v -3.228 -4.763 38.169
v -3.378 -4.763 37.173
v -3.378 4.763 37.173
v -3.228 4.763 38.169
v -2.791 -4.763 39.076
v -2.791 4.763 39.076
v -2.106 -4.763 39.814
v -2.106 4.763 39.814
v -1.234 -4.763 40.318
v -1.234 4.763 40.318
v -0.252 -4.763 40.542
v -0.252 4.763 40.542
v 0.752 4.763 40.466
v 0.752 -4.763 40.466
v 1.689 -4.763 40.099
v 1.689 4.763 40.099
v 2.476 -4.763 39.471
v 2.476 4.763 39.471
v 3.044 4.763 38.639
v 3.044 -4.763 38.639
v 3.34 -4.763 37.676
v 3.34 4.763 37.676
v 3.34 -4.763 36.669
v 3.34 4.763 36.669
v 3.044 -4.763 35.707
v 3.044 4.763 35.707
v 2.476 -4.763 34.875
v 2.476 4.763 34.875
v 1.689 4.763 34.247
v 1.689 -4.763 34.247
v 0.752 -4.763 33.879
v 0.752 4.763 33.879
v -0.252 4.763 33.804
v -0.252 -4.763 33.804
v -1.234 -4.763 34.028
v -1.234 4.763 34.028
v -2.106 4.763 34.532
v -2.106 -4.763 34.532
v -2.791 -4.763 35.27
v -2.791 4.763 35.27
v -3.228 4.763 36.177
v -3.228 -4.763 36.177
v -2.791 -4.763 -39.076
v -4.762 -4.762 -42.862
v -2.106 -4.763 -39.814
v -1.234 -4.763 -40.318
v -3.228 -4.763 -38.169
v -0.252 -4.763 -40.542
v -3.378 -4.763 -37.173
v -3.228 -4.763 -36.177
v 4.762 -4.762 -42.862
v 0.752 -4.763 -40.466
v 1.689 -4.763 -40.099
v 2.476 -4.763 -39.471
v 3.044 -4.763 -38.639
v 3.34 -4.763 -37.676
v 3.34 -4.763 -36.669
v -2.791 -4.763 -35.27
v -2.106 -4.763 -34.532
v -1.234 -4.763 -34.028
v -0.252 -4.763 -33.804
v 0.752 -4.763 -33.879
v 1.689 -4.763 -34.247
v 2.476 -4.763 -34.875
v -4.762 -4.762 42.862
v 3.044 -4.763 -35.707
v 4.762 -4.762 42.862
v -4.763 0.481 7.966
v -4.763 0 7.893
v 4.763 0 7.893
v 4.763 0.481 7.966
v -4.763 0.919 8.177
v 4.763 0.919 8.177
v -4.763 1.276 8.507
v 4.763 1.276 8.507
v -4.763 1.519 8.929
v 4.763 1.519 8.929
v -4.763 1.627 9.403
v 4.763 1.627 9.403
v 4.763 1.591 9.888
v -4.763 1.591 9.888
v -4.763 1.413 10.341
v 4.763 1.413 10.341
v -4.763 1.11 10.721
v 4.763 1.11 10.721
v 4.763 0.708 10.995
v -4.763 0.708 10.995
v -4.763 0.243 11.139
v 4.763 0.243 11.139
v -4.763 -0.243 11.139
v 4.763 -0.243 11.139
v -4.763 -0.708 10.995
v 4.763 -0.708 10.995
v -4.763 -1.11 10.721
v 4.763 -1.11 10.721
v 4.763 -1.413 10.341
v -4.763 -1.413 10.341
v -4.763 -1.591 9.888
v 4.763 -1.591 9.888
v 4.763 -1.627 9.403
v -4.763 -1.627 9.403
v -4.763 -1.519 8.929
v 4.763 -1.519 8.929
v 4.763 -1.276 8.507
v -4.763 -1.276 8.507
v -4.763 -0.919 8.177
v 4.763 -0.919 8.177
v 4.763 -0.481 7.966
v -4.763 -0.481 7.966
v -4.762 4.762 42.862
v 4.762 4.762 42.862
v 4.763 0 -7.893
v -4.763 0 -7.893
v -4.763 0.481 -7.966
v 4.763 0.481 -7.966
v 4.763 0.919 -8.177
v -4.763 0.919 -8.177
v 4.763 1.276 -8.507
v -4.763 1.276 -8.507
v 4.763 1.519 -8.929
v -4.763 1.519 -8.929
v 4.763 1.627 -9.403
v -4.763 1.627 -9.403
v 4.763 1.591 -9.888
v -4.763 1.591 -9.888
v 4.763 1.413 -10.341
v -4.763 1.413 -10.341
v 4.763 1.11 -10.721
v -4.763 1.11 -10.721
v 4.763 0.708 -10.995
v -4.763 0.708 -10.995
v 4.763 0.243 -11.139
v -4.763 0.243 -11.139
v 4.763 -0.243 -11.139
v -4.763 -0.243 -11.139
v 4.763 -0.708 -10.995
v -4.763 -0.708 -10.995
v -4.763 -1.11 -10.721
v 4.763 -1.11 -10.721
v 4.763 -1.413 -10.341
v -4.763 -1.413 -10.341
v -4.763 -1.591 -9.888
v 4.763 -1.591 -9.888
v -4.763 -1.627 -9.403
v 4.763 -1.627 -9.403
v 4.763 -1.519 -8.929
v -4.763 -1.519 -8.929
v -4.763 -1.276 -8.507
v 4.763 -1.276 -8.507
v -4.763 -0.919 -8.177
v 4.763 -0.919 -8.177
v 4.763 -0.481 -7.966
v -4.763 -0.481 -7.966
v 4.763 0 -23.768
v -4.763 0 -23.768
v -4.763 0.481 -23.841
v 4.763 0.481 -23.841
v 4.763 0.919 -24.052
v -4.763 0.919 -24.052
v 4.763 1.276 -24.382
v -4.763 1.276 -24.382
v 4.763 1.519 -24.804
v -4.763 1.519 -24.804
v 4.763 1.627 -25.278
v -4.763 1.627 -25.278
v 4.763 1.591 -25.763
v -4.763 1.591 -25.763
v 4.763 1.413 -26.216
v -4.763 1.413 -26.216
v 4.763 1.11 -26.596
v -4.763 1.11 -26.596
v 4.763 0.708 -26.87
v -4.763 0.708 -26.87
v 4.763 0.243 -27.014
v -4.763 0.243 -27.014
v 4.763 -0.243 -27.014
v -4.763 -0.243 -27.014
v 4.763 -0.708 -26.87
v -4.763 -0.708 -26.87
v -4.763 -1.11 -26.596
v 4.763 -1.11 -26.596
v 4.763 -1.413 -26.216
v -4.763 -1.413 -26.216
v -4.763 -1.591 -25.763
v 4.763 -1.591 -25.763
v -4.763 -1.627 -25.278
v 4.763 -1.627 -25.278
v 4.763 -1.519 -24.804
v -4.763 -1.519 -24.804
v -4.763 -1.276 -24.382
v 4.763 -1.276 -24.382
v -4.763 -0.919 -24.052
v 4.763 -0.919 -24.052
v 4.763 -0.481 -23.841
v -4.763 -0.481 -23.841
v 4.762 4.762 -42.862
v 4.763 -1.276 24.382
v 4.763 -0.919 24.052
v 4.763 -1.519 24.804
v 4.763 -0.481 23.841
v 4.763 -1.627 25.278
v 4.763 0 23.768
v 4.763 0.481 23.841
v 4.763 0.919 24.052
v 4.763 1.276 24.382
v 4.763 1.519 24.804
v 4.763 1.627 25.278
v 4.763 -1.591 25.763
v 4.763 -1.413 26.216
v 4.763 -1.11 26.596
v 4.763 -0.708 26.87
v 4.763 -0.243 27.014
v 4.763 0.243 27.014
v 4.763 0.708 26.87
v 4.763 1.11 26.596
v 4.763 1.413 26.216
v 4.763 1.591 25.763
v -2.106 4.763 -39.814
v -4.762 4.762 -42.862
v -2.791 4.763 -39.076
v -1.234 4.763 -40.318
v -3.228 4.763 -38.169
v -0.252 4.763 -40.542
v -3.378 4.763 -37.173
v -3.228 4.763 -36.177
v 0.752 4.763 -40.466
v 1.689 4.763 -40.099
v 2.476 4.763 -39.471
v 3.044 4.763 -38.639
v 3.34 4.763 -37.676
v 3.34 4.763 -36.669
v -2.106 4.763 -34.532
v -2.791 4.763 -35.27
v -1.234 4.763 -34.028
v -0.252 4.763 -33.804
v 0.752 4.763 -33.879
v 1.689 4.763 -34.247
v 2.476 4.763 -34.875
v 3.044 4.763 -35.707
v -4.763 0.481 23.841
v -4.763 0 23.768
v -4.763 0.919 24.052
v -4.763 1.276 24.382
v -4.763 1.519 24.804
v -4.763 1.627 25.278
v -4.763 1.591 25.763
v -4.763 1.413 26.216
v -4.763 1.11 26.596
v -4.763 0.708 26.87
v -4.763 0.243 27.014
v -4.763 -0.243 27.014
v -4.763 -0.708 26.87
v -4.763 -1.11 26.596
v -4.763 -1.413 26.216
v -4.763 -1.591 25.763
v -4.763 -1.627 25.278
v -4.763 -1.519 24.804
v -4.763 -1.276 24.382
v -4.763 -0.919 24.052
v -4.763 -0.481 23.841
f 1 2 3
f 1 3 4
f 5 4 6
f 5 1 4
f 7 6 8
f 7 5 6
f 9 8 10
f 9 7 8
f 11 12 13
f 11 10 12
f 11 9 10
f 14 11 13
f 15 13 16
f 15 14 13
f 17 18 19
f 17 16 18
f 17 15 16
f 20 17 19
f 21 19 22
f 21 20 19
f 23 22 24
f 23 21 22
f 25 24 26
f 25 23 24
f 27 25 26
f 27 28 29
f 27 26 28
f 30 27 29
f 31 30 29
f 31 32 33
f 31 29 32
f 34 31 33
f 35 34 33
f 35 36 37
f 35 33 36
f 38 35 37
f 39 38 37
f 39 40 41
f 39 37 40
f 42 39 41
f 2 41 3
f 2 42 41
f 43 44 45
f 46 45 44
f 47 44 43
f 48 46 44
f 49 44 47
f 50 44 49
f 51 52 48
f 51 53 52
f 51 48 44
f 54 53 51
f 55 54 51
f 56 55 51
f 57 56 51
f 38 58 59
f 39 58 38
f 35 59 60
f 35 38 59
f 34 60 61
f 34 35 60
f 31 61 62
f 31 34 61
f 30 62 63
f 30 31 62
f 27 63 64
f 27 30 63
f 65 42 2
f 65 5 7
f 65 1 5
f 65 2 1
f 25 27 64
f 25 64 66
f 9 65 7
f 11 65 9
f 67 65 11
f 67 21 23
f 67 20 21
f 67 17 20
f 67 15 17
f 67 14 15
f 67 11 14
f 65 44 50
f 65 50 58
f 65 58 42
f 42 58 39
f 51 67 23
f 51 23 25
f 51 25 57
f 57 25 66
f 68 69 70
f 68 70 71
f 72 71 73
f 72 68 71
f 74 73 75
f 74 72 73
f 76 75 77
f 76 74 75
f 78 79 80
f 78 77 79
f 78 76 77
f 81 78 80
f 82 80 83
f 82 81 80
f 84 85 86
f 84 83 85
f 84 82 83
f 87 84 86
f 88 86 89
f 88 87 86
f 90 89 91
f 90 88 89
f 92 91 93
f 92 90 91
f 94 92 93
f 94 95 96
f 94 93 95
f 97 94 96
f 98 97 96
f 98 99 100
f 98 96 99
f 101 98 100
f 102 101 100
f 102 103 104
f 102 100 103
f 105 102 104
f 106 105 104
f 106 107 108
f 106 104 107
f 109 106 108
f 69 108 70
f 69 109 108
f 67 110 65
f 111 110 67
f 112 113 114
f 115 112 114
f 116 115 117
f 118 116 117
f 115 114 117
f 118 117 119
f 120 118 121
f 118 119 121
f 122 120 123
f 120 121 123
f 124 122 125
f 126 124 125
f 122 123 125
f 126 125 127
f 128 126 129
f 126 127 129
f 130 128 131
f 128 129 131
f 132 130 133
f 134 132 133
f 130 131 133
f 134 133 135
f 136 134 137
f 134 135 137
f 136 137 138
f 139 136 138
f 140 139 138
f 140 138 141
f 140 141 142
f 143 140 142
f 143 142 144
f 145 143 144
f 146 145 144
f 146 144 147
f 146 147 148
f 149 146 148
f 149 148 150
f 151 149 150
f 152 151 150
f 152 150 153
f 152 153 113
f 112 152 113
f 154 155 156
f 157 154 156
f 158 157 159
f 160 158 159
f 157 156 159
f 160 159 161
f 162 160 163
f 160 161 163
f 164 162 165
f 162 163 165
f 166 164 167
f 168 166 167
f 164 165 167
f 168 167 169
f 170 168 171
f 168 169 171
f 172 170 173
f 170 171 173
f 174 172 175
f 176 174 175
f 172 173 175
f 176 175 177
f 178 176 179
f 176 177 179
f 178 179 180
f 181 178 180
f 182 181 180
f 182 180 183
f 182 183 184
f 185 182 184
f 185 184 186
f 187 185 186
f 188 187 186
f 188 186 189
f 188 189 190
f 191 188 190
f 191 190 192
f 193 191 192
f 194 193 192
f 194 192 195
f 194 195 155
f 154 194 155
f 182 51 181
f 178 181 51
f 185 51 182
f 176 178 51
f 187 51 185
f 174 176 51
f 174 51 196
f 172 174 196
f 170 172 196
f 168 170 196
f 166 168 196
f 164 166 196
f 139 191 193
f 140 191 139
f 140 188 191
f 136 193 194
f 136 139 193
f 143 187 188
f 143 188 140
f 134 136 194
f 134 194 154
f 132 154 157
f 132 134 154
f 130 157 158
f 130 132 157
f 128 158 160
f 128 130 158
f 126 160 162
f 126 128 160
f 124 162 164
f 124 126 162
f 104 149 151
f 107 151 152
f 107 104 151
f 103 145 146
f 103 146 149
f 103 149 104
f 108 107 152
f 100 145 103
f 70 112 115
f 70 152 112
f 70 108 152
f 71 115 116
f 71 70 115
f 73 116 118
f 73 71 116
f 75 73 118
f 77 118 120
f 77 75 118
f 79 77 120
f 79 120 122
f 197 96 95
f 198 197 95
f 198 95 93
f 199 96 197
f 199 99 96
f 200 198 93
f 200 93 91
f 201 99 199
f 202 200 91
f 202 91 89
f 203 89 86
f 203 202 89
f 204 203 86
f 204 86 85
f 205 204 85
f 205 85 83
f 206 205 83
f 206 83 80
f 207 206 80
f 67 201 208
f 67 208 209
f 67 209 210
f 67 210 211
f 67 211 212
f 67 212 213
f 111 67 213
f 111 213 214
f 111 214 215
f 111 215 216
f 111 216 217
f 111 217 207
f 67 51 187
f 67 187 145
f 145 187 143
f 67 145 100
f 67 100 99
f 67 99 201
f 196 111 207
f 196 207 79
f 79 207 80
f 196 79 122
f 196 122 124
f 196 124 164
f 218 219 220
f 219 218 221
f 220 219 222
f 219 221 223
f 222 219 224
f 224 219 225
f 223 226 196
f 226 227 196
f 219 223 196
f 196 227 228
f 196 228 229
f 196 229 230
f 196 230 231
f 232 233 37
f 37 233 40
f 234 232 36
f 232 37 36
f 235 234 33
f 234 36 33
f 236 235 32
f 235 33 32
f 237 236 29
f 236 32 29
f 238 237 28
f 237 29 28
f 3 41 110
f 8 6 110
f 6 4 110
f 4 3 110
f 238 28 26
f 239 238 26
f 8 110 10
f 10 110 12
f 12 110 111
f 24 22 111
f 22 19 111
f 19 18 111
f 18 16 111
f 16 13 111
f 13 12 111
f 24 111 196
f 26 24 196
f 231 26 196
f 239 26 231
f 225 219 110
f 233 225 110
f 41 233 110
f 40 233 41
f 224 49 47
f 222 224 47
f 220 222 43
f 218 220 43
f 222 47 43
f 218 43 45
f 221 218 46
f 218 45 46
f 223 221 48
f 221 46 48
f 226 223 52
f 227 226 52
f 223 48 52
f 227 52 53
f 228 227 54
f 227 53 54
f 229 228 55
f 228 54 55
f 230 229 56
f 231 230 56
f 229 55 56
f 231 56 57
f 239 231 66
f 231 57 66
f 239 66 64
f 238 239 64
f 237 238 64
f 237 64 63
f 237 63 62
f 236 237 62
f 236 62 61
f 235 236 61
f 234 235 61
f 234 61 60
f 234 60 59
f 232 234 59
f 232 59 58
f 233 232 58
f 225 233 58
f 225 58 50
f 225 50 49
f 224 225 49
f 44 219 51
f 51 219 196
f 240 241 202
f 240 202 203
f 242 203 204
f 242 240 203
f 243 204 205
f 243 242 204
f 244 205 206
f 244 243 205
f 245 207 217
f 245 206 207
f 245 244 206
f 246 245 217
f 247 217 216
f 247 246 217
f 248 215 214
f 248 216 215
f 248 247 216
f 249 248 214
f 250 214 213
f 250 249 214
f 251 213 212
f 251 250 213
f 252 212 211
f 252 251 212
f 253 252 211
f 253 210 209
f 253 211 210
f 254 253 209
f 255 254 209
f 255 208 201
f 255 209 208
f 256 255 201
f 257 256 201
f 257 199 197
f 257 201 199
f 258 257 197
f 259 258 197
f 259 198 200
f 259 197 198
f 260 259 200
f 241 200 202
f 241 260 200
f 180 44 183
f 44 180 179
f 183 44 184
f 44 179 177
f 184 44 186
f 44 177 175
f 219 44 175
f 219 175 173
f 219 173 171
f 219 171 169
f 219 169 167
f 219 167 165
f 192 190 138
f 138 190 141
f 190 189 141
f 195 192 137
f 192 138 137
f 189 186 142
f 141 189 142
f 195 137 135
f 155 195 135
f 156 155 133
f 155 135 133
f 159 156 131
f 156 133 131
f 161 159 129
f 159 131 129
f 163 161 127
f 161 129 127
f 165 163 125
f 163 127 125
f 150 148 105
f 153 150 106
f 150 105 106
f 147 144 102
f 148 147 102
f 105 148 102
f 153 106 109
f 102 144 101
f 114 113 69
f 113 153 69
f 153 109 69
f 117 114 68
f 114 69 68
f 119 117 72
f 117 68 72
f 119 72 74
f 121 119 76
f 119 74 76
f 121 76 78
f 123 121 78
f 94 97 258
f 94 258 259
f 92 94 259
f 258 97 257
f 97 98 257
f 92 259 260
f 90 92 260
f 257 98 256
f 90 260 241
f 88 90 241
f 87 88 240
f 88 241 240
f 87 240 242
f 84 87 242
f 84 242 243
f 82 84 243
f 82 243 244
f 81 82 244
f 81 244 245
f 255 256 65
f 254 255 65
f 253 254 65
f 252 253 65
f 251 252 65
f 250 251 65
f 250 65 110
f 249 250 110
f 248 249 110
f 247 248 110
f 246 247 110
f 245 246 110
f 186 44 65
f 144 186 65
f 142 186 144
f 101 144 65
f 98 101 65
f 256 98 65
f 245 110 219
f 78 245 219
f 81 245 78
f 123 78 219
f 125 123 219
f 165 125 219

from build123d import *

# Parameters (mm, degrees)
SKETCH1_W               = 9.525
SKETCH1_H               = 9.525
BOSS_EXTRUDE1_DEPTH     = 42.8625
F_1_4_CLEARANCE_HOLE1_D = 6.7564
F_4_CLEARANCE_HOLE1_D   = 3.2639


with BuildPart() as part:
    # Sketch1 → Boss-Extrude1 (new, symmetric)
    with BuildSketch(Plane.XY):
        Rectangle(SKETCH1_W, SKETCH1_H)
    extrude(amount=BOSS_EXTRUDE1_DEPTH, both=True)

    # 1/4 Clearance Hole1 (through all)
    with Locations(Plane(origin=(0, 4.7625, 0), x_dir=(1, 0, 0), z_dir=(0, 1, 0))):
        with Locations((0, 37.1729)):
            f_1_4_clearance_hole1 = Hole(F_1_4_CLEARANCE_HOLE1_D / 2)

    # Mirror1: 1/4 Clearance Hole1 across plane
    add(f_1_4_clearance_hole1.mirror(Plane.XY), mode=Mode.SUBTRACT)

    # #4 Clearance Hole1 (through all)
    with Locations(Plane(origin=(4.7625, 0, 0), x_dir=(0, 0, -1), z_dir=(1, 0, 0))):
        with Locations((9.525, 0), (25.4, 0)):
            f_4_clearance_hole1 = Hole(F_4_CLEARANCE_HOLE1_D / 2)

    # Mirror2: #4 Clearance Hole1 across plane
    add(f_4_clearance_hole1.mirror(Plane.XY), mode=Mode.SUBTRACT)


solid = part.part
